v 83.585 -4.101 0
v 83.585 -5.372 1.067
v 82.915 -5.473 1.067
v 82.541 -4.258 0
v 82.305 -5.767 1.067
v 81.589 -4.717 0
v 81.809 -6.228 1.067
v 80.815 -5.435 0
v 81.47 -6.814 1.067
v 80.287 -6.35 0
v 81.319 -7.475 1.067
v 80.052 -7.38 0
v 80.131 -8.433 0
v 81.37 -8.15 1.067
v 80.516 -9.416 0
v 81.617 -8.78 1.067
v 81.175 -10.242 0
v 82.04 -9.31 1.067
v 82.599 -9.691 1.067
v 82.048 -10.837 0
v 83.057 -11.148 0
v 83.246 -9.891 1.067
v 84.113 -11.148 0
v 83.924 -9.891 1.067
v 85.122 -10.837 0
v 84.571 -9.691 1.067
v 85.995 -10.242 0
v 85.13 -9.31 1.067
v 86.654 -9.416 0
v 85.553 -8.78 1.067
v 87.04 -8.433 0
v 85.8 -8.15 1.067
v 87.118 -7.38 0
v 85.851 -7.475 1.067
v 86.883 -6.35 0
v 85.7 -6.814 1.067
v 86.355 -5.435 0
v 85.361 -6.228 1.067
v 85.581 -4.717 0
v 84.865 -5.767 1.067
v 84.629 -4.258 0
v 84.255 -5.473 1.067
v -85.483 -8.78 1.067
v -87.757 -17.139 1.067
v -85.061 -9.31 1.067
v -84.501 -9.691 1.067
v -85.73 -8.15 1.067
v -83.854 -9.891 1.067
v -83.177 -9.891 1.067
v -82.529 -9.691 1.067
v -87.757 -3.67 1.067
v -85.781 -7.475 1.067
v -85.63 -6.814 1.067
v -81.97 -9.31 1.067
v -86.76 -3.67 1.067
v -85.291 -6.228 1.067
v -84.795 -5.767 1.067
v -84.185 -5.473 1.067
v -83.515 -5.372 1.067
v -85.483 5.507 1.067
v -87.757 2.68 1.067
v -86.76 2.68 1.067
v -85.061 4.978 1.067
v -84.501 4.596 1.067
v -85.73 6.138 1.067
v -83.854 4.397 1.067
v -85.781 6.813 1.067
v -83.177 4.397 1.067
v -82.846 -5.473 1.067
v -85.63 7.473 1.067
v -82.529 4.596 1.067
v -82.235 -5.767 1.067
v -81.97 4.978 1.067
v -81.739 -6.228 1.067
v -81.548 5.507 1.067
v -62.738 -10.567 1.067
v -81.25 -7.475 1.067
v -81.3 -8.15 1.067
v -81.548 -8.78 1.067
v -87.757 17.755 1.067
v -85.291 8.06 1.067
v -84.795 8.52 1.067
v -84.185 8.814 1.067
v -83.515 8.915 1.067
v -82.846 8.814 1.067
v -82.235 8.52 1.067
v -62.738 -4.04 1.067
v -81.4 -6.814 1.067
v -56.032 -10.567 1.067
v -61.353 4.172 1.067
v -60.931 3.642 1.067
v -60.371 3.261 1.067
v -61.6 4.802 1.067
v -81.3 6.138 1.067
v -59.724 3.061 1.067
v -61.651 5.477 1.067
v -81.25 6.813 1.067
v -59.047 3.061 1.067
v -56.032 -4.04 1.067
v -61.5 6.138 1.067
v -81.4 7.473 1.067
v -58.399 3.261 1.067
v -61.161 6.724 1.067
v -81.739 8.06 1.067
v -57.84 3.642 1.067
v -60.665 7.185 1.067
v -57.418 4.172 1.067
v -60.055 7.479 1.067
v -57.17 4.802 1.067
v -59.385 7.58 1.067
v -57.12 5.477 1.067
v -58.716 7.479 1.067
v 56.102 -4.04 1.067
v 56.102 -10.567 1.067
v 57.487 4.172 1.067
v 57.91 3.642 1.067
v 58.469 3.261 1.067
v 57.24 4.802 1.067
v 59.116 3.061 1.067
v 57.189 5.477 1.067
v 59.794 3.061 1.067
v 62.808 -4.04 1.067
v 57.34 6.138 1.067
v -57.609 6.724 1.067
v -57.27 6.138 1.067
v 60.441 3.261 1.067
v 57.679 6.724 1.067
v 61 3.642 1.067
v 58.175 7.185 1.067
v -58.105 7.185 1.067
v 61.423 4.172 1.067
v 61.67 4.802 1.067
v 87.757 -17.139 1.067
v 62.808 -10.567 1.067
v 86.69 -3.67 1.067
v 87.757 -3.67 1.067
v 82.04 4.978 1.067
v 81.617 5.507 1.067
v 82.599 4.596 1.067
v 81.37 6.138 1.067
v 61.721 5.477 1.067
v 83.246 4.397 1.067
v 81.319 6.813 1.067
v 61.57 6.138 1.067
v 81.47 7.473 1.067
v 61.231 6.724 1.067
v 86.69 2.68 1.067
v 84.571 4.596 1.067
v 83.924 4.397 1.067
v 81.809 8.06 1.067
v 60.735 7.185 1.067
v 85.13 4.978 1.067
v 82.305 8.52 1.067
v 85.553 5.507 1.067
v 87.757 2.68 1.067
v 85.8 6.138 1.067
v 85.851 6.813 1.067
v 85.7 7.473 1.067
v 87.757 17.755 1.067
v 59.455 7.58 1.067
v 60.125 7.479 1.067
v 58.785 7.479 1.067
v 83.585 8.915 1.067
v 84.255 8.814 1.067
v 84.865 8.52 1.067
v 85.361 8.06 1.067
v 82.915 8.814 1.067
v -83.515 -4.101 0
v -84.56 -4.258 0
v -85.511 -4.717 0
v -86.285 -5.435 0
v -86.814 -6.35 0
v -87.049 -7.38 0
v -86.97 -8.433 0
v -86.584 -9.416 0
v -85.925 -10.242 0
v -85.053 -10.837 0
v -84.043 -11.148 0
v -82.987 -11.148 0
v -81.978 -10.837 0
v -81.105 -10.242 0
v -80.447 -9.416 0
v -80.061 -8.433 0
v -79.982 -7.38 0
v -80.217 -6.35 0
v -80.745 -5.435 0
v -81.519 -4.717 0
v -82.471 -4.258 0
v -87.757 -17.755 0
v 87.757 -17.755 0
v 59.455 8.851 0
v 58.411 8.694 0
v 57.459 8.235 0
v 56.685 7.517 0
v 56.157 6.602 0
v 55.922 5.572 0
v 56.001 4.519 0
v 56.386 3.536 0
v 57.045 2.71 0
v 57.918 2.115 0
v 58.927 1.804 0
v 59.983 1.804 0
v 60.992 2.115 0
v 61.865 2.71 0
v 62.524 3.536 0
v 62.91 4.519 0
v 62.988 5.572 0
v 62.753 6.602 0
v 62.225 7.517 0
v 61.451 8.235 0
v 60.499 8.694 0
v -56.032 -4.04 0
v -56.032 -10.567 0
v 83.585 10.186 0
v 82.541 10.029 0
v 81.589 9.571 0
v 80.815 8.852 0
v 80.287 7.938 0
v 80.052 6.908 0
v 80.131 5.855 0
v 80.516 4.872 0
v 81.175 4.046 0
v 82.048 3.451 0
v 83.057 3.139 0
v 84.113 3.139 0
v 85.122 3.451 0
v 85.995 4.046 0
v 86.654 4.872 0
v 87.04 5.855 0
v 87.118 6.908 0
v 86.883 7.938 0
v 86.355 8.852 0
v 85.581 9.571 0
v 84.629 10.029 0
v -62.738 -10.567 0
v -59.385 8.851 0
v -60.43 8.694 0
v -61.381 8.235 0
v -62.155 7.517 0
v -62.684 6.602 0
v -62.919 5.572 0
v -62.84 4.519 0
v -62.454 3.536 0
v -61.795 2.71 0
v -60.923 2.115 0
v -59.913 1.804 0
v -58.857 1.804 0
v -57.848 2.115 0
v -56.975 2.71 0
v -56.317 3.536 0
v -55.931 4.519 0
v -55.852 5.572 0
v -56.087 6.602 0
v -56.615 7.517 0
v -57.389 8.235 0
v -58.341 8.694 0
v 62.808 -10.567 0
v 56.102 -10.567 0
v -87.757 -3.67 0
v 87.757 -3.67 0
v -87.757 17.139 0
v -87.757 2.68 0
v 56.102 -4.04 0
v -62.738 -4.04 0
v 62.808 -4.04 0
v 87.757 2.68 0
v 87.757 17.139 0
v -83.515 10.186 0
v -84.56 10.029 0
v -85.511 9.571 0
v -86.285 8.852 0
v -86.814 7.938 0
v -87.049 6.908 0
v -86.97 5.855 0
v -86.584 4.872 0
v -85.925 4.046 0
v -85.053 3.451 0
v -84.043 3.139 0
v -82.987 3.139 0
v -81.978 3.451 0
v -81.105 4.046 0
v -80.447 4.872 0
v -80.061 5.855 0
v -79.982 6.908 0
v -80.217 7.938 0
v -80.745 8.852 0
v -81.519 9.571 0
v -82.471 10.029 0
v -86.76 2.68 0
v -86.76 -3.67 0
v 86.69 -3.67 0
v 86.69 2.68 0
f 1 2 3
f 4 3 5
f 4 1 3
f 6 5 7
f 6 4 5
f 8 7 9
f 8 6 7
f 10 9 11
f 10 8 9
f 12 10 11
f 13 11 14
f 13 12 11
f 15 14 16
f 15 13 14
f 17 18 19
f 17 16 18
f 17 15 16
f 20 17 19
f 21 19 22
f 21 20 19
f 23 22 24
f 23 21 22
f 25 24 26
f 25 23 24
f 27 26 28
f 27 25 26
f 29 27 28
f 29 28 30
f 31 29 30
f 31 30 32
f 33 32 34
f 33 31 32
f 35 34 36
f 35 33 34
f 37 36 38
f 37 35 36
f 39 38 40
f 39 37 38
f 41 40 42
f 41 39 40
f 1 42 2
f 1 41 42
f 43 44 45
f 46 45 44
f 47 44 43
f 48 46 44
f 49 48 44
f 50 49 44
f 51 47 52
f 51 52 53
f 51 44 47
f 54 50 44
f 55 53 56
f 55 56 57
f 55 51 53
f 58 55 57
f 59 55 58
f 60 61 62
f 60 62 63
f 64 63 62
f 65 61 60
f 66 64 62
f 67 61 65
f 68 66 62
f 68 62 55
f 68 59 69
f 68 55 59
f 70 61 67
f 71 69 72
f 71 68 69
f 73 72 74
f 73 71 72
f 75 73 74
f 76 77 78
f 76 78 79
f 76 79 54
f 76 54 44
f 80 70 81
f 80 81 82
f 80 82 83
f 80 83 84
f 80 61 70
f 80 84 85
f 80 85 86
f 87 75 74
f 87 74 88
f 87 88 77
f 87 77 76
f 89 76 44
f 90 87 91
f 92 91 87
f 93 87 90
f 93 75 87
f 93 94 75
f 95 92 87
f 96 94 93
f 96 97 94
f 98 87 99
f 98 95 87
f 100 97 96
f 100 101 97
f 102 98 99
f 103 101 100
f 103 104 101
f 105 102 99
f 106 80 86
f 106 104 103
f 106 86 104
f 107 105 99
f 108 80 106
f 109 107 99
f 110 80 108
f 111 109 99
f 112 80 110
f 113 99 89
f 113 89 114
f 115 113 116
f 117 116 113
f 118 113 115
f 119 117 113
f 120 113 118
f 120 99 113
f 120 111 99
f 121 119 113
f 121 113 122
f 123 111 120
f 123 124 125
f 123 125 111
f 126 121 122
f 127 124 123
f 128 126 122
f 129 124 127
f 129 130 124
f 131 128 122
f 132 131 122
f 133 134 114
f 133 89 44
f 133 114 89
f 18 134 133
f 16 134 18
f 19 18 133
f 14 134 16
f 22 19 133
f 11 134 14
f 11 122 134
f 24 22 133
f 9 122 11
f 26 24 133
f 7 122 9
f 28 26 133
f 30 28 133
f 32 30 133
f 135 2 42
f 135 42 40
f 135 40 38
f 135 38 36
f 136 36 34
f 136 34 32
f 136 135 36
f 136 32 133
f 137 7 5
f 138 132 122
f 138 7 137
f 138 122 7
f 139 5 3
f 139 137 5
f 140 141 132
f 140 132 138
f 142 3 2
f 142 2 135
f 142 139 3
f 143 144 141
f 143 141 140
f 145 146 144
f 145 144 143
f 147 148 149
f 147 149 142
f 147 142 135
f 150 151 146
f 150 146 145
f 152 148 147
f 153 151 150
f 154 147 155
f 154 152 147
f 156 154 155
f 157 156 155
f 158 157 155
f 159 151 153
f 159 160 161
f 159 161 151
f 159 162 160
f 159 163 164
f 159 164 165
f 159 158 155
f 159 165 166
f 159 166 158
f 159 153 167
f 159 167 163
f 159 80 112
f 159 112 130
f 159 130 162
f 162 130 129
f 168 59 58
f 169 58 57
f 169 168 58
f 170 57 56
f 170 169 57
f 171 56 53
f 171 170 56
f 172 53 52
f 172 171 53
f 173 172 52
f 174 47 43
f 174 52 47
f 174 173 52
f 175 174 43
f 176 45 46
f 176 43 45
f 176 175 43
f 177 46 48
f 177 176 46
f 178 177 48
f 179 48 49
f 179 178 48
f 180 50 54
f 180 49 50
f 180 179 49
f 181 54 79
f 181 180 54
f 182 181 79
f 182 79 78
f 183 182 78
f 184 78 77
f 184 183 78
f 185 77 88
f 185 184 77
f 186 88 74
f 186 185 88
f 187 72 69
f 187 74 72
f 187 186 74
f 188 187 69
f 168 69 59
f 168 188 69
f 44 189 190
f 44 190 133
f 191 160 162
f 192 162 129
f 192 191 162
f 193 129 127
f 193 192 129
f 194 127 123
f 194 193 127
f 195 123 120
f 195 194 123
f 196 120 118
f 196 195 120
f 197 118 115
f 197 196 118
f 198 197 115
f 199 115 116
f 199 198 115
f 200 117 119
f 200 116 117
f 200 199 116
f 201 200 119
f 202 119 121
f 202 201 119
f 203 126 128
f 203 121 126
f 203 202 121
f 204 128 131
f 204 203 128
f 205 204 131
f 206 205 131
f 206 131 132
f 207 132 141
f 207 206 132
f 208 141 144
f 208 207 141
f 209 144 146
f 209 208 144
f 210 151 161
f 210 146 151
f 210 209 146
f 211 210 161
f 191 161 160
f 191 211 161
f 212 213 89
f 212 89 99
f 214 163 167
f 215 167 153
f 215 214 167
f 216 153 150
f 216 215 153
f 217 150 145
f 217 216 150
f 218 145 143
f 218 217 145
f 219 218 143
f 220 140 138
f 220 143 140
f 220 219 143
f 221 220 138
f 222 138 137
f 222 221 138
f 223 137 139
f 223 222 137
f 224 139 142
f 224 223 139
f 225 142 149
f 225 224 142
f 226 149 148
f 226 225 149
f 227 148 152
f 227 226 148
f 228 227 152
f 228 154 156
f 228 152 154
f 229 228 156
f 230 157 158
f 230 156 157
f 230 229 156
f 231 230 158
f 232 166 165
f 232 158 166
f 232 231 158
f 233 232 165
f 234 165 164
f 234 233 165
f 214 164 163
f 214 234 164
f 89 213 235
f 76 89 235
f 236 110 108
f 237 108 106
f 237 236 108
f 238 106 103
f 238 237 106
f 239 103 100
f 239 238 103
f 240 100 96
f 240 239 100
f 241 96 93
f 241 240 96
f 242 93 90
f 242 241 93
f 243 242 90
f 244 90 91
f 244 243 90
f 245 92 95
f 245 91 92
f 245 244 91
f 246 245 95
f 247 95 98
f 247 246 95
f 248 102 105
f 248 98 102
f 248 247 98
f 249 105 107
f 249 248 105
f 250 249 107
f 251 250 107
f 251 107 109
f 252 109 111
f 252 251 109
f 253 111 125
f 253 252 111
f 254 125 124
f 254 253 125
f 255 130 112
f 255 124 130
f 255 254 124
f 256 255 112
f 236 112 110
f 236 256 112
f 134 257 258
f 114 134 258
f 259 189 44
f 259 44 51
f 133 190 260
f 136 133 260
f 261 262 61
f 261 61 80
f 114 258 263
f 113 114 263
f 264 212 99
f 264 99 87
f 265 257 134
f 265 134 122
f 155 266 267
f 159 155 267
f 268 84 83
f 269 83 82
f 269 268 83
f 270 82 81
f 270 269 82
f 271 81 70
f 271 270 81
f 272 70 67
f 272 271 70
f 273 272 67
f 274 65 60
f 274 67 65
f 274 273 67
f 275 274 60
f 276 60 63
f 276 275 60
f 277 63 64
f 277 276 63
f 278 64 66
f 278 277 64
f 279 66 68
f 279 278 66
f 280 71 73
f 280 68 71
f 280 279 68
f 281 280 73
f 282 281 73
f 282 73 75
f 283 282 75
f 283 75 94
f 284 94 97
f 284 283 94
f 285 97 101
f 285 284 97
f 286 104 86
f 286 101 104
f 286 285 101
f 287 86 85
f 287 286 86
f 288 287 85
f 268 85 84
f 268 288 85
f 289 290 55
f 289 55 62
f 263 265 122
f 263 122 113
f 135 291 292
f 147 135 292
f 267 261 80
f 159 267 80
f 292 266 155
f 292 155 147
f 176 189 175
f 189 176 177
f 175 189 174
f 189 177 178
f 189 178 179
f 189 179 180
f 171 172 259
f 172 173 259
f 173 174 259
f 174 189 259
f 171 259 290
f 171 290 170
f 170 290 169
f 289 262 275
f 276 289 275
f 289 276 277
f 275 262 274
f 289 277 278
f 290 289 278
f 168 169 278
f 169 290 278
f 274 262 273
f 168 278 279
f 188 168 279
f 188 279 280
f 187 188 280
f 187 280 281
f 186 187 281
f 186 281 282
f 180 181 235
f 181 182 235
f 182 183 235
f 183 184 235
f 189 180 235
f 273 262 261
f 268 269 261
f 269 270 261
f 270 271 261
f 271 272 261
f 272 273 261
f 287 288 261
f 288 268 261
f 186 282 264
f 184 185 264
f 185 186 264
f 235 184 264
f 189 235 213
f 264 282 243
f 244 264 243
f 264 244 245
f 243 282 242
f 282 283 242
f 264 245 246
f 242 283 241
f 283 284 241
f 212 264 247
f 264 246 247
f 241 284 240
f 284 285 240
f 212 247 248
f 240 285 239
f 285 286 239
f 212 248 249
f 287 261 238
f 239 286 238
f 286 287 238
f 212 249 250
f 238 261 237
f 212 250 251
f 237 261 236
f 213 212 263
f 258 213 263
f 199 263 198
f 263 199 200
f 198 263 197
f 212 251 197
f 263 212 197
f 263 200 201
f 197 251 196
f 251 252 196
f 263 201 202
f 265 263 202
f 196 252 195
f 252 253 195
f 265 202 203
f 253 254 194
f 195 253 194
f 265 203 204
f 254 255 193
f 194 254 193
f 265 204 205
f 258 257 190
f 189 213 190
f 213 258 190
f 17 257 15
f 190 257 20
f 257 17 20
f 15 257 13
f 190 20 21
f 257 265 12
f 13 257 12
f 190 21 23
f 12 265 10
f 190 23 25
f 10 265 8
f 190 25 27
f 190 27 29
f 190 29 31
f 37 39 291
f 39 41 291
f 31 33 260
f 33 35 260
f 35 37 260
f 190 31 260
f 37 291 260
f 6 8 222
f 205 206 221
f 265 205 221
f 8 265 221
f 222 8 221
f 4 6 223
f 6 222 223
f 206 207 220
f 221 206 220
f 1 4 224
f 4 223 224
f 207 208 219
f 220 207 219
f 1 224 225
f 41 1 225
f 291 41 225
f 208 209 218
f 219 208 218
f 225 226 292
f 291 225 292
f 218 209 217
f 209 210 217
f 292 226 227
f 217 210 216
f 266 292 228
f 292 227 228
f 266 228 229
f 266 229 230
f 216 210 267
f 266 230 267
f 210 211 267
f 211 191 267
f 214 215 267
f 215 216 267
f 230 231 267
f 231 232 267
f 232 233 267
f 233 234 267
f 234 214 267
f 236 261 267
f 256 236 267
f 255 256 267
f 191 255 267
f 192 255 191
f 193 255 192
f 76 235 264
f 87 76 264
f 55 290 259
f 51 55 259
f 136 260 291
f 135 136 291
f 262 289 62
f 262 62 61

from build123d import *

# Parameters (mm, degrees)
SKETCH1_W                                 = 175.514
SKETCH1_H                                 = 35.5092
BOSS_EXTRUDE1_DEPTH                       = 1.0668
CUT_EXTRUDE2_DEPTH                        = 177.412947596
SKETCH8_W                                 = 6.7056
SKETCH8_H                                 = 6.5278
SKETCH8_W_2                               = 6.35
SKETCH8_H_2                               = 6.1722
SKETCH8_W_3                               = 1.0668
SKETCH8_H_3                               = 6.35
CUT_EXTRUDE3_DEPTH                        = 90.541358781
CSK_FOR_6_FLAT_HEAD_MACHINE_SCREW_2_COUNT = 2
CSK_FOR_6_FLAT_HEAD_MACHINE_SCREW_2_PITCH = 24.166931253
CSK_FOR_6_FLAT_HEAD_MACHINE_SCREW_3_COUNT = 2
CSK_FOR_6_FLAT_HEAD_MACHINE_SCREW_3_PITCH = 27.386313674
CSK_FOR_6_FLAT_HEAD_MACHINE_SCREW_4_COUNT = 2
CSK_FOR_6_FLAT_HEAD_MACHINE_SCREW_4_PITCH = 118.84025
CSK_FOR_6_FLAT_HEAD_MACHINE_SCREW_5_COUNT = 2
CSK_FOR_6_FLAT_HEAD_MACHINE_SCREW_5_PITCH = 142.976487796
CSK_FOR_6_FLAT_HEAD_MACHINE_SCREW_6_COUNT = 2
CSK_FOR_6_FLAT_HEAD_MACHINE_SCREW_6_PITCH = 143.555722815


with BuildPart() as part:
    # Sketch1 → Boss-Extrude1 (new body)
    with BuildSketch(Plane.XY):
        Rectangle(SKETCH1_W, SKETCH1_H)
    extrude(amount=BOSS_EXTRUDE1_DEPTH)

    # Sketch7 → Cut-Extrude2 (cut, through all)
    with BuildSketch(Plane.ZY.offset(87.757)):
        Polygon((0, 17.138682733), (1.0668, 17.7546), (0, 17.7546), align=None)
        Polygon((0, -17.7546), (1.0668, -17.138682733), (1.0668, -17.7546), align=None)
    extrude(amount=-CUT_EXTRUDE2_DEPTH, mode=Mode.SUBTRACT)

    # Sketch8 → Cut-Extrude3 (cut, through all)
    # profile 1 of 4: a face of its own
    with BuildSketch(Plane(origin=(0, 0, 0), x_dir=(-1, 0, 0), z_dir=(0, 0, -1))):
        with Locations((59.3852, -7.303463684)):
            Rectangle(SKETCH8_W, SKETCH8_H)
        with Locations((59.3852, -7.303463684)):
            Rectangle(SKETCH8_W_2, SKETCH8_H_2, mode=Mode.SUBTRACT)
    # profile 2 of 4: a face of its own
    with BuildSketch(Plane(origin=(0, 0, 0), x_dir=(-1, 0, 0), z_dir=(0, 0, -1))):
        with Locations((-87.2236, -0.494716366)):
            Rectangle(SKETCH8_W_3, SKETCH8_H_3)
    # profile 3 of 4: a face of its own
    with BuildSketch(Plane(origin=(0, 0, 0), x_dir=(-1, 0, 0), z_dir=(0, 0, -1))):
        with Locations((-59.45505, -7.303467884)):
            Rectangle(SKETCH8_W, SKETCH8_H)
        with Locations((-59.45505, -7.303467884)):
            Rectangle(SKETCH8_W_2, SKETCH8_H_2, mode=Mode.SUBTRACT)
    # profile 4 of 4: a face of its own
    with BuildSketch(Plane(origin=(0, 0, 0), x_dir=(-1, 0, 0), z_dir=(0, 0, -1))):
        with Locations((87.29345, -0.494712166)):
            Rectangle(SKETCH8_W_3, SKETCH8_H_3)
    extrude(amount=-CUT_EXTRUDE3_DEPTH, mode=Mode.SUBTRACT)


with BuildPart() as cut_extrude3_kept_piece:
    # of the separate pieces the step leaves, the one the design keeps (cut_extrude3_pieces_kept)
    add(part.part.solids().sort_by_distance((-87.757, -17.138682733, 1.0668))[0])

    # Sketch9 → CSK for #6 Flat Head Machine Screw (100)1 (revolve, cut)
    with BuildSketch(Plane(origin=(59.45505, 5.307632116, 0), x_dir=(0, 1, 0), z_dir=(1, 0, 0))):
        Polygon((0, 0), (0, 1.0668), (1.89865, 1.0668), (1.89865, 1.380025208), (3.5433, 0), align=None)
    csk_for_6_flat_head_machine_screw_100 = revolve(axis=Axis((59.45505, 5.307632116, -6.35), (0, 0, 1)), mode=Mode.SUBTRACT)

    # CSK for _6 Flat Head Machine Screw _ 2: CSK for #6 Flat Head Machine Screw (100)1 ×2
    with Locations(*[Vector(0.9984718269541709, 0.05526310504125029, 0) * (i * CSK_FOR_6_FLAT_HEAD_MACHINE_SCREW_2_PITCH) for i in range(1, CSK_FOR_6_FLAT_HEAD_MACHINE_SCREW_2_COUNT)]):
        add(csk_for_6_flat_head_machine_screw_100, mode=Mode.SUBTRACT)

    # CSK for _6 Flat Head Machine Screw _ 3: CSK for #6 Flat Head Machine Screw (100)1 ×2
    with Locations(*[Vector(0.881097043122147, -0.4729355142103514, 0) * (i * CSK_FOR_6_FLAT_HEAD_MACHINE_SCREW_3_PITCH) for i in range(1, CSK_FOR_6_FLAT_HEAD_MACHINE_SCREW_3_COUNT)]):
        add(csk_for_6_flat_head_machine_screw_100, mode=Mode.SUBTRACT)

    # CSK for _6 Flat Head Machine Screw _ 4: CSK for #6 Flat Head Machine Screw (100)1 ×2
    with Locations(*[(-i * CSK_FOR_6_FLAT_HEAD_MACHINE_SCREW_4_PITCH, 0, 0) for i in range(1, CSK_FOR_6_FLAT_HEAD_MACHINE_SCREW_4_COUNT)]):
        add(csk_for_6_flat_head_machine_screw_100, mode=Mode.SUBTRACT)

    # CSK for _6 Flat Head Machine Screw _ 5: CSK for #6 Flat Head Machine Screw (100)1 ×2
    with Locations(*[Vector(-0.9999563718759208, 0.009341003412130584, 0) * (i * CSK_FOR_6_FLAT_HEAD_MACHINE_SCREW_5_PITCH) for i in range(1, CSK_FOR_6_FLAT_HEAD_MACHINE_SCREW_5_COUNT)]):
        add(csk_for_6_flat_head_machine_screw_100, mode=Mode.SUBTRACT)

    # CSK for _6 Flat Head Machine Screw _ 6: CSK for #6 Flat Head Machine Screw (100)1 ×2
    with Locations(*[Vector(-0.9959216337502219, -0.09022249956795243, 0) * (i * CSK_FOR_6_FLAT_HEAD_MACHINE_SCREW_6_PITCH) for i in range(1, CSK_FOR_6_FLAT_HEAD_MACHINE_SCREW_6_COUNT)]):
        add(csk_for_6_flat_head_machine_screw_100, mode=Mode.SUBTRACT)


solid = cut_extrude3_kept_piece.part
